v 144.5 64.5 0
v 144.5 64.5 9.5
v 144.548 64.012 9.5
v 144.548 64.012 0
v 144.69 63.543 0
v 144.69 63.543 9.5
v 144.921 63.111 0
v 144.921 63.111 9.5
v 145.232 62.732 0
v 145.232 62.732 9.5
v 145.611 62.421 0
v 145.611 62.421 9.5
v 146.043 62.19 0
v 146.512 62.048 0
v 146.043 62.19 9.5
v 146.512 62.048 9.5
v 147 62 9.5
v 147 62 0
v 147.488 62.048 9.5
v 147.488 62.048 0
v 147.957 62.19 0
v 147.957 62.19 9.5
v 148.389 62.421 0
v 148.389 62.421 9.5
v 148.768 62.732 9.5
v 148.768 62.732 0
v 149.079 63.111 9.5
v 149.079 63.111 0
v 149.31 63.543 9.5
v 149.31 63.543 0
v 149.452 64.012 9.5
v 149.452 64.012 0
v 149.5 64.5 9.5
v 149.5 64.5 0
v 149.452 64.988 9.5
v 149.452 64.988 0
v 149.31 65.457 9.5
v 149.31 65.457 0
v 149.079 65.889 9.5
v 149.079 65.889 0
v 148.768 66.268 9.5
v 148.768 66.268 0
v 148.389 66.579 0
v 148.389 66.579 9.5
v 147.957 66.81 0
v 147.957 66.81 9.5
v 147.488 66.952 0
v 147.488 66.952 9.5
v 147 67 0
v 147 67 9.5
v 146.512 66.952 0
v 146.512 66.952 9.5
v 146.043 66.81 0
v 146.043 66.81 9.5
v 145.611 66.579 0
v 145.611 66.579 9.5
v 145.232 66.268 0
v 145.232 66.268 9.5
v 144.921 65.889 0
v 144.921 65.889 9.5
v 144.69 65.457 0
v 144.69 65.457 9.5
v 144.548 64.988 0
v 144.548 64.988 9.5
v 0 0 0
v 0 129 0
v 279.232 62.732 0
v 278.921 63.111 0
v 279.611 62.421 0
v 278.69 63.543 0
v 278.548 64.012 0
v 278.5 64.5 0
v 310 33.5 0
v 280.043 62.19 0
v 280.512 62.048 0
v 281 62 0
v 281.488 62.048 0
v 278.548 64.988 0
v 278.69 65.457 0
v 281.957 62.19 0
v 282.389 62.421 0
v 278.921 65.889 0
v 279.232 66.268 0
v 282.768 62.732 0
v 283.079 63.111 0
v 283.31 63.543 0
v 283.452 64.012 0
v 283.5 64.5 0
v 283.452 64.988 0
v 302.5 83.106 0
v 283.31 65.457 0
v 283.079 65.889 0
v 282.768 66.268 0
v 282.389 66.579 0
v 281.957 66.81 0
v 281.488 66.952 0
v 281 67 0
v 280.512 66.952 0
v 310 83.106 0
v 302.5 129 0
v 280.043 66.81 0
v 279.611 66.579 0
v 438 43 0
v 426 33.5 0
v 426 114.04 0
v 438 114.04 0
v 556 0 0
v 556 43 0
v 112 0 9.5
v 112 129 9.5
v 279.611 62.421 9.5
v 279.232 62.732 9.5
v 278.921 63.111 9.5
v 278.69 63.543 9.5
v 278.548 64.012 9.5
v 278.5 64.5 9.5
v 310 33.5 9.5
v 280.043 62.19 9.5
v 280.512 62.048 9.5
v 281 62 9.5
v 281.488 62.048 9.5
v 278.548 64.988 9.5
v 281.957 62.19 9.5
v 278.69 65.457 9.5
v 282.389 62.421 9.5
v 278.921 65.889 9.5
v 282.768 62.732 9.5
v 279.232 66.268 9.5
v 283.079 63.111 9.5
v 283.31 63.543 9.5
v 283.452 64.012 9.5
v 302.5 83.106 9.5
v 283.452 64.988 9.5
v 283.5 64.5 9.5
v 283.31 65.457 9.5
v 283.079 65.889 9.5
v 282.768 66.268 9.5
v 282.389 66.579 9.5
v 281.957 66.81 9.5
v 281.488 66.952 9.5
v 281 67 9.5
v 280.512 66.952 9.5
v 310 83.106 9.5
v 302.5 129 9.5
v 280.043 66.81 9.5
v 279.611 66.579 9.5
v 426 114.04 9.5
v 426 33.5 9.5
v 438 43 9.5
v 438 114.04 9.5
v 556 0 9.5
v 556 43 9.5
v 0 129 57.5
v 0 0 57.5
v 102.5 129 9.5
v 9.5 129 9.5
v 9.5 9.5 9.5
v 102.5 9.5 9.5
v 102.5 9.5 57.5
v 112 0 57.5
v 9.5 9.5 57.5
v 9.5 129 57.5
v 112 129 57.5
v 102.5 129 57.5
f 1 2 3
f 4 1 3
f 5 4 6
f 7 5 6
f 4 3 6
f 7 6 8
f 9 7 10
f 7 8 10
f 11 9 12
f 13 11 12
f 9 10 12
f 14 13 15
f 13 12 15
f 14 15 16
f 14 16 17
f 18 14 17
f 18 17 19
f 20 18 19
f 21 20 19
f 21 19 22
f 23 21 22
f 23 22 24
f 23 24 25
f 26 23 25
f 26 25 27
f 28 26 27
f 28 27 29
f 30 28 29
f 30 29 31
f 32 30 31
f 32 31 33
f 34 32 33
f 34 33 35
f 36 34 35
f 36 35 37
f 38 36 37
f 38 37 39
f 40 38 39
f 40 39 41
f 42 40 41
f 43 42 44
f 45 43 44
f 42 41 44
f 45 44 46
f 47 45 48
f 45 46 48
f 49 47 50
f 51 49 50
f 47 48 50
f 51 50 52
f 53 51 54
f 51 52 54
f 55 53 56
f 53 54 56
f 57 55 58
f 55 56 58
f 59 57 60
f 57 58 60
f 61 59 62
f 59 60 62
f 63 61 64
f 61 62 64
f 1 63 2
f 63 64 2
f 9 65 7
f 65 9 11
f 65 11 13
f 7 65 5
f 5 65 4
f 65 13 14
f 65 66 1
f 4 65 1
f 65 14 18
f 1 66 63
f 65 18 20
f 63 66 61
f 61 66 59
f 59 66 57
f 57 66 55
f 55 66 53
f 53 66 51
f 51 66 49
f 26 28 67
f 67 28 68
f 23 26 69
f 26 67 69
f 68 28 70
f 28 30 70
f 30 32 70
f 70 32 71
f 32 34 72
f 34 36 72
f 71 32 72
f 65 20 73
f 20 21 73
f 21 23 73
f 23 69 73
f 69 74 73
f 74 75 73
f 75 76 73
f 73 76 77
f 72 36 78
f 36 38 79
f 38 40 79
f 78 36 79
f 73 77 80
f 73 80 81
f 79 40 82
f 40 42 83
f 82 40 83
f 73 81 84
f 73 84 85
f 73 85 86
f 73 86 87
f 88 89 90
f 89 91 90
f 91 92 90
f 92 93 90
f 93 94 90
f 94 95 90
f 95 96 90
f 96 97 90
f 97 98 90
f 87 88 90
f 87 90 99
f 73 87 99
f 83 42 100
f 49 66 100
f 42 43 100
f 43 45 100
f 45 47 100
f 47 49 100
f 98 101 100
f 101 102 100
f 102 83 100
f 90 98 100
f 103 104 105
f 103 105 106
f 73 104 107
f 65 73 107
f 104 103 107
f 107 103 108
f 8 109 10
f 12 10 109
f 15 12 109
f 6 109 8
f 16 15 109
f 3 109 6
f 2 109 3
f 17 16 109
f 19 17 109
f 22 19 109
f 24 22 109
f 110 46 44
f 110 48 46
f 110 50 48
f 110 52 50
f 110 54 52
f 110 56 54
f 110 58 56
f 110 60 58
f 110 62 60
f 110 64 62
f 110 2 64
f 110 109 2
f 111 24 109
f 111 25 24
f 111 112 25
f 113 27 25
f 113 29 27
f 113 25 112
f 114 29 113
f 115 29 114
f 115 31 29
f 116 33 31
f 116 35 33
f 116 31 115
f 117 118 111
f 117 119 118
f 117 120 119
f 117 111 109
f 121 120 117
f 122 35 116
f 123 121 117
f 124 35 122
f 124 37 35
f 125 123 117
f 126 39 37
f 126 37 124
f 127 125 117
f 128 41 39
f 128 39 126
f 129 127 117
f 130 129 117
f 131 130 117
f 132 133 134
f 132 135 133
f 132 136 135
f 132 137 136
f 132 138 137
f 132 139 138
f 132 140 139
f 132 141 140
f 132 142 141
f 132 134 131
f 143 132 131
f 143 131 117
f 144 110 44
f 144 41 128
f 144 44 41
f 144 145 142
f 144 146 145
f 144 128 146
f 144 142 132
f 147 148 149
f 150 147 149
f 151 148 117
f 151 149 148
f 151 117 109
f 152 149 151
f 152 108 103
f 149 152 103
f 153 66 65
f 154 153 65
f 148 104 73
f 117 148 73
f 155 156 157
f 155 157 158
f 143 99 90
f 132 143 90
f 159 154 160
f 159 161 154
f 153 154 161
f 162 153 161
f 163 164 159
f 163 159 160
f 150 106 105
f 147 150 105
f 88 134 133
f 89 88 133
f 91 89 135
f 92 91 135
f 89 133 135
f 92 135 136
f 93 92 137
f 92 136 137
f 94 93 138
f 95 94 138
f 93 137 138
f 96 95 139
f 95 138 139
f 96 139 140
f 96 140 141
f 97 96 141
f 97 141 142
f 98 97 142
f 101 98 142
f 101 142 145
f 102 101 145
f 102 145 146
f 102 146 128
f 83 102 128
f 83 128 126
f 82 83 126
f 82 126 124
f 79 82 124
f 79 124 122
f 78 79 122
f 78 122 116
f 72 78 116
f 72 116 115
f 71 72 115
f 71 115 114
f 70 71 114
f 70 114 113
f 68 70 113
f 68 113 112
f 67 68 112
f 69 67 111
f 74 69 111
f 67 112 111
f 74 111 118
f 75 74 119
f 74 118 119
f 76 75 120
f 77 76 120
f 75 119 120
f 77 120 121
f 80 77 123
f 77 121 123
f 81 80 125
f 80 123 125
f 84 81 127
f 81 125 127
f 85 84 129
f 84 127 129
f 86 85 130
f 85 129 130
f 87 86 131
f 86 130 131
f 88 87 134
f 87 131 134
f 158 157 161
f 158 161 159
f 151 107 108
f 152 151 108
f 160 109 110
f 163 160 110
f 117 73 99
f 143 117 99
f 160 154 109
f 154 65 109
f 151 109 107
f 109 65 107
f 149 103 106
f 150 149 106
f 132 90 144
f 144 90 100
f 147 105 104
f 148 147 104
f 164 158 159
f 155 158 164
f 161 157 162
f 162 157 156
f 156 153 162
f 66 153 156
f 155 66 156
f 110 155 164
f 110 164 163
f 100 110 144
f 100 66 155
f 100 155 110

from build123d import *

# Parameters (mm, degrees)
F1_DEPTH = 9.5
F2_W     = 9.5
F2_H     = 119.5
F2_H_2   = 9.5
F2_W_2   = 93
F3_DEPTH = 48
F5_DEPTH = 25.4


with BuildPart() as f1:
    # F0 (on Top) → F1 (new body)
    with BuildSketch(Plane.XY):
        Polygon((0, 129), (0, 0), (556, 0), (556, 43), (438, 43), (438, 114.0399202704), (426, 114.0399202704), (426, 33.5), (310, 33.5), (310, 83.1064879894), (302.5, 83.1064879894), (302.5, 129), align=None)
    extrude(amount=F1_DEPTH)

    # F2 (on face) → F3 (join)
    with BuildSketch(Plane.XY.offset(9.5)):
        with Locations((4.75, 69.25)):
            Rectangle(F2_W, F2_H)
        with Locations((4.75, 4.75)):
            Rectangle(F2_W, F2_H_2)
        with Locations((56, 4.75)):
            Rectangle(F2_W_2, F2_H_2)
        with Locations((107.25, 69.25)):
            Rectangle(F2_W, F2_H)
        with Locations((107.25, 4.75)):
            Rectangle(F2_W, F2_H_2)
    extrude(amount=F3_DEPTH)

    # F4 (on face) → F5 (cut)
    with BuildSketch(Plane.XY.offset(9.5)):
        with BuildLine():
            ThreePointArc((149.5, 64.5), (147, 67), (144.5, 64.5))
            Line((144.5, 64.5), (149.5, 64.5))
        make_face()
        with BuildLine():
            Line((149.5, 64.5), (144.5, 64.5))
            ThreePointArc((144.5, 64.5), (147, 62), (149.5, 64.5))
        make_face()
        with BuildLine():
            Line((283.5, 64.5), (278.5, 64.5))
            ThreePointArc((278.5, 64.5), (281, 62), (283.5, 64.5))
        make_face()
        with BuildLine():
            ThreePointArc((283.5, 64.5), (281, 67), (278.5, 64.5))
            Line((278.5, 64.5), (283.5, 64.5))
        make_face()
    extrude(amount=-F5_DEPTH, mode=Mode.SUBTRACT)


solid = f1.part
